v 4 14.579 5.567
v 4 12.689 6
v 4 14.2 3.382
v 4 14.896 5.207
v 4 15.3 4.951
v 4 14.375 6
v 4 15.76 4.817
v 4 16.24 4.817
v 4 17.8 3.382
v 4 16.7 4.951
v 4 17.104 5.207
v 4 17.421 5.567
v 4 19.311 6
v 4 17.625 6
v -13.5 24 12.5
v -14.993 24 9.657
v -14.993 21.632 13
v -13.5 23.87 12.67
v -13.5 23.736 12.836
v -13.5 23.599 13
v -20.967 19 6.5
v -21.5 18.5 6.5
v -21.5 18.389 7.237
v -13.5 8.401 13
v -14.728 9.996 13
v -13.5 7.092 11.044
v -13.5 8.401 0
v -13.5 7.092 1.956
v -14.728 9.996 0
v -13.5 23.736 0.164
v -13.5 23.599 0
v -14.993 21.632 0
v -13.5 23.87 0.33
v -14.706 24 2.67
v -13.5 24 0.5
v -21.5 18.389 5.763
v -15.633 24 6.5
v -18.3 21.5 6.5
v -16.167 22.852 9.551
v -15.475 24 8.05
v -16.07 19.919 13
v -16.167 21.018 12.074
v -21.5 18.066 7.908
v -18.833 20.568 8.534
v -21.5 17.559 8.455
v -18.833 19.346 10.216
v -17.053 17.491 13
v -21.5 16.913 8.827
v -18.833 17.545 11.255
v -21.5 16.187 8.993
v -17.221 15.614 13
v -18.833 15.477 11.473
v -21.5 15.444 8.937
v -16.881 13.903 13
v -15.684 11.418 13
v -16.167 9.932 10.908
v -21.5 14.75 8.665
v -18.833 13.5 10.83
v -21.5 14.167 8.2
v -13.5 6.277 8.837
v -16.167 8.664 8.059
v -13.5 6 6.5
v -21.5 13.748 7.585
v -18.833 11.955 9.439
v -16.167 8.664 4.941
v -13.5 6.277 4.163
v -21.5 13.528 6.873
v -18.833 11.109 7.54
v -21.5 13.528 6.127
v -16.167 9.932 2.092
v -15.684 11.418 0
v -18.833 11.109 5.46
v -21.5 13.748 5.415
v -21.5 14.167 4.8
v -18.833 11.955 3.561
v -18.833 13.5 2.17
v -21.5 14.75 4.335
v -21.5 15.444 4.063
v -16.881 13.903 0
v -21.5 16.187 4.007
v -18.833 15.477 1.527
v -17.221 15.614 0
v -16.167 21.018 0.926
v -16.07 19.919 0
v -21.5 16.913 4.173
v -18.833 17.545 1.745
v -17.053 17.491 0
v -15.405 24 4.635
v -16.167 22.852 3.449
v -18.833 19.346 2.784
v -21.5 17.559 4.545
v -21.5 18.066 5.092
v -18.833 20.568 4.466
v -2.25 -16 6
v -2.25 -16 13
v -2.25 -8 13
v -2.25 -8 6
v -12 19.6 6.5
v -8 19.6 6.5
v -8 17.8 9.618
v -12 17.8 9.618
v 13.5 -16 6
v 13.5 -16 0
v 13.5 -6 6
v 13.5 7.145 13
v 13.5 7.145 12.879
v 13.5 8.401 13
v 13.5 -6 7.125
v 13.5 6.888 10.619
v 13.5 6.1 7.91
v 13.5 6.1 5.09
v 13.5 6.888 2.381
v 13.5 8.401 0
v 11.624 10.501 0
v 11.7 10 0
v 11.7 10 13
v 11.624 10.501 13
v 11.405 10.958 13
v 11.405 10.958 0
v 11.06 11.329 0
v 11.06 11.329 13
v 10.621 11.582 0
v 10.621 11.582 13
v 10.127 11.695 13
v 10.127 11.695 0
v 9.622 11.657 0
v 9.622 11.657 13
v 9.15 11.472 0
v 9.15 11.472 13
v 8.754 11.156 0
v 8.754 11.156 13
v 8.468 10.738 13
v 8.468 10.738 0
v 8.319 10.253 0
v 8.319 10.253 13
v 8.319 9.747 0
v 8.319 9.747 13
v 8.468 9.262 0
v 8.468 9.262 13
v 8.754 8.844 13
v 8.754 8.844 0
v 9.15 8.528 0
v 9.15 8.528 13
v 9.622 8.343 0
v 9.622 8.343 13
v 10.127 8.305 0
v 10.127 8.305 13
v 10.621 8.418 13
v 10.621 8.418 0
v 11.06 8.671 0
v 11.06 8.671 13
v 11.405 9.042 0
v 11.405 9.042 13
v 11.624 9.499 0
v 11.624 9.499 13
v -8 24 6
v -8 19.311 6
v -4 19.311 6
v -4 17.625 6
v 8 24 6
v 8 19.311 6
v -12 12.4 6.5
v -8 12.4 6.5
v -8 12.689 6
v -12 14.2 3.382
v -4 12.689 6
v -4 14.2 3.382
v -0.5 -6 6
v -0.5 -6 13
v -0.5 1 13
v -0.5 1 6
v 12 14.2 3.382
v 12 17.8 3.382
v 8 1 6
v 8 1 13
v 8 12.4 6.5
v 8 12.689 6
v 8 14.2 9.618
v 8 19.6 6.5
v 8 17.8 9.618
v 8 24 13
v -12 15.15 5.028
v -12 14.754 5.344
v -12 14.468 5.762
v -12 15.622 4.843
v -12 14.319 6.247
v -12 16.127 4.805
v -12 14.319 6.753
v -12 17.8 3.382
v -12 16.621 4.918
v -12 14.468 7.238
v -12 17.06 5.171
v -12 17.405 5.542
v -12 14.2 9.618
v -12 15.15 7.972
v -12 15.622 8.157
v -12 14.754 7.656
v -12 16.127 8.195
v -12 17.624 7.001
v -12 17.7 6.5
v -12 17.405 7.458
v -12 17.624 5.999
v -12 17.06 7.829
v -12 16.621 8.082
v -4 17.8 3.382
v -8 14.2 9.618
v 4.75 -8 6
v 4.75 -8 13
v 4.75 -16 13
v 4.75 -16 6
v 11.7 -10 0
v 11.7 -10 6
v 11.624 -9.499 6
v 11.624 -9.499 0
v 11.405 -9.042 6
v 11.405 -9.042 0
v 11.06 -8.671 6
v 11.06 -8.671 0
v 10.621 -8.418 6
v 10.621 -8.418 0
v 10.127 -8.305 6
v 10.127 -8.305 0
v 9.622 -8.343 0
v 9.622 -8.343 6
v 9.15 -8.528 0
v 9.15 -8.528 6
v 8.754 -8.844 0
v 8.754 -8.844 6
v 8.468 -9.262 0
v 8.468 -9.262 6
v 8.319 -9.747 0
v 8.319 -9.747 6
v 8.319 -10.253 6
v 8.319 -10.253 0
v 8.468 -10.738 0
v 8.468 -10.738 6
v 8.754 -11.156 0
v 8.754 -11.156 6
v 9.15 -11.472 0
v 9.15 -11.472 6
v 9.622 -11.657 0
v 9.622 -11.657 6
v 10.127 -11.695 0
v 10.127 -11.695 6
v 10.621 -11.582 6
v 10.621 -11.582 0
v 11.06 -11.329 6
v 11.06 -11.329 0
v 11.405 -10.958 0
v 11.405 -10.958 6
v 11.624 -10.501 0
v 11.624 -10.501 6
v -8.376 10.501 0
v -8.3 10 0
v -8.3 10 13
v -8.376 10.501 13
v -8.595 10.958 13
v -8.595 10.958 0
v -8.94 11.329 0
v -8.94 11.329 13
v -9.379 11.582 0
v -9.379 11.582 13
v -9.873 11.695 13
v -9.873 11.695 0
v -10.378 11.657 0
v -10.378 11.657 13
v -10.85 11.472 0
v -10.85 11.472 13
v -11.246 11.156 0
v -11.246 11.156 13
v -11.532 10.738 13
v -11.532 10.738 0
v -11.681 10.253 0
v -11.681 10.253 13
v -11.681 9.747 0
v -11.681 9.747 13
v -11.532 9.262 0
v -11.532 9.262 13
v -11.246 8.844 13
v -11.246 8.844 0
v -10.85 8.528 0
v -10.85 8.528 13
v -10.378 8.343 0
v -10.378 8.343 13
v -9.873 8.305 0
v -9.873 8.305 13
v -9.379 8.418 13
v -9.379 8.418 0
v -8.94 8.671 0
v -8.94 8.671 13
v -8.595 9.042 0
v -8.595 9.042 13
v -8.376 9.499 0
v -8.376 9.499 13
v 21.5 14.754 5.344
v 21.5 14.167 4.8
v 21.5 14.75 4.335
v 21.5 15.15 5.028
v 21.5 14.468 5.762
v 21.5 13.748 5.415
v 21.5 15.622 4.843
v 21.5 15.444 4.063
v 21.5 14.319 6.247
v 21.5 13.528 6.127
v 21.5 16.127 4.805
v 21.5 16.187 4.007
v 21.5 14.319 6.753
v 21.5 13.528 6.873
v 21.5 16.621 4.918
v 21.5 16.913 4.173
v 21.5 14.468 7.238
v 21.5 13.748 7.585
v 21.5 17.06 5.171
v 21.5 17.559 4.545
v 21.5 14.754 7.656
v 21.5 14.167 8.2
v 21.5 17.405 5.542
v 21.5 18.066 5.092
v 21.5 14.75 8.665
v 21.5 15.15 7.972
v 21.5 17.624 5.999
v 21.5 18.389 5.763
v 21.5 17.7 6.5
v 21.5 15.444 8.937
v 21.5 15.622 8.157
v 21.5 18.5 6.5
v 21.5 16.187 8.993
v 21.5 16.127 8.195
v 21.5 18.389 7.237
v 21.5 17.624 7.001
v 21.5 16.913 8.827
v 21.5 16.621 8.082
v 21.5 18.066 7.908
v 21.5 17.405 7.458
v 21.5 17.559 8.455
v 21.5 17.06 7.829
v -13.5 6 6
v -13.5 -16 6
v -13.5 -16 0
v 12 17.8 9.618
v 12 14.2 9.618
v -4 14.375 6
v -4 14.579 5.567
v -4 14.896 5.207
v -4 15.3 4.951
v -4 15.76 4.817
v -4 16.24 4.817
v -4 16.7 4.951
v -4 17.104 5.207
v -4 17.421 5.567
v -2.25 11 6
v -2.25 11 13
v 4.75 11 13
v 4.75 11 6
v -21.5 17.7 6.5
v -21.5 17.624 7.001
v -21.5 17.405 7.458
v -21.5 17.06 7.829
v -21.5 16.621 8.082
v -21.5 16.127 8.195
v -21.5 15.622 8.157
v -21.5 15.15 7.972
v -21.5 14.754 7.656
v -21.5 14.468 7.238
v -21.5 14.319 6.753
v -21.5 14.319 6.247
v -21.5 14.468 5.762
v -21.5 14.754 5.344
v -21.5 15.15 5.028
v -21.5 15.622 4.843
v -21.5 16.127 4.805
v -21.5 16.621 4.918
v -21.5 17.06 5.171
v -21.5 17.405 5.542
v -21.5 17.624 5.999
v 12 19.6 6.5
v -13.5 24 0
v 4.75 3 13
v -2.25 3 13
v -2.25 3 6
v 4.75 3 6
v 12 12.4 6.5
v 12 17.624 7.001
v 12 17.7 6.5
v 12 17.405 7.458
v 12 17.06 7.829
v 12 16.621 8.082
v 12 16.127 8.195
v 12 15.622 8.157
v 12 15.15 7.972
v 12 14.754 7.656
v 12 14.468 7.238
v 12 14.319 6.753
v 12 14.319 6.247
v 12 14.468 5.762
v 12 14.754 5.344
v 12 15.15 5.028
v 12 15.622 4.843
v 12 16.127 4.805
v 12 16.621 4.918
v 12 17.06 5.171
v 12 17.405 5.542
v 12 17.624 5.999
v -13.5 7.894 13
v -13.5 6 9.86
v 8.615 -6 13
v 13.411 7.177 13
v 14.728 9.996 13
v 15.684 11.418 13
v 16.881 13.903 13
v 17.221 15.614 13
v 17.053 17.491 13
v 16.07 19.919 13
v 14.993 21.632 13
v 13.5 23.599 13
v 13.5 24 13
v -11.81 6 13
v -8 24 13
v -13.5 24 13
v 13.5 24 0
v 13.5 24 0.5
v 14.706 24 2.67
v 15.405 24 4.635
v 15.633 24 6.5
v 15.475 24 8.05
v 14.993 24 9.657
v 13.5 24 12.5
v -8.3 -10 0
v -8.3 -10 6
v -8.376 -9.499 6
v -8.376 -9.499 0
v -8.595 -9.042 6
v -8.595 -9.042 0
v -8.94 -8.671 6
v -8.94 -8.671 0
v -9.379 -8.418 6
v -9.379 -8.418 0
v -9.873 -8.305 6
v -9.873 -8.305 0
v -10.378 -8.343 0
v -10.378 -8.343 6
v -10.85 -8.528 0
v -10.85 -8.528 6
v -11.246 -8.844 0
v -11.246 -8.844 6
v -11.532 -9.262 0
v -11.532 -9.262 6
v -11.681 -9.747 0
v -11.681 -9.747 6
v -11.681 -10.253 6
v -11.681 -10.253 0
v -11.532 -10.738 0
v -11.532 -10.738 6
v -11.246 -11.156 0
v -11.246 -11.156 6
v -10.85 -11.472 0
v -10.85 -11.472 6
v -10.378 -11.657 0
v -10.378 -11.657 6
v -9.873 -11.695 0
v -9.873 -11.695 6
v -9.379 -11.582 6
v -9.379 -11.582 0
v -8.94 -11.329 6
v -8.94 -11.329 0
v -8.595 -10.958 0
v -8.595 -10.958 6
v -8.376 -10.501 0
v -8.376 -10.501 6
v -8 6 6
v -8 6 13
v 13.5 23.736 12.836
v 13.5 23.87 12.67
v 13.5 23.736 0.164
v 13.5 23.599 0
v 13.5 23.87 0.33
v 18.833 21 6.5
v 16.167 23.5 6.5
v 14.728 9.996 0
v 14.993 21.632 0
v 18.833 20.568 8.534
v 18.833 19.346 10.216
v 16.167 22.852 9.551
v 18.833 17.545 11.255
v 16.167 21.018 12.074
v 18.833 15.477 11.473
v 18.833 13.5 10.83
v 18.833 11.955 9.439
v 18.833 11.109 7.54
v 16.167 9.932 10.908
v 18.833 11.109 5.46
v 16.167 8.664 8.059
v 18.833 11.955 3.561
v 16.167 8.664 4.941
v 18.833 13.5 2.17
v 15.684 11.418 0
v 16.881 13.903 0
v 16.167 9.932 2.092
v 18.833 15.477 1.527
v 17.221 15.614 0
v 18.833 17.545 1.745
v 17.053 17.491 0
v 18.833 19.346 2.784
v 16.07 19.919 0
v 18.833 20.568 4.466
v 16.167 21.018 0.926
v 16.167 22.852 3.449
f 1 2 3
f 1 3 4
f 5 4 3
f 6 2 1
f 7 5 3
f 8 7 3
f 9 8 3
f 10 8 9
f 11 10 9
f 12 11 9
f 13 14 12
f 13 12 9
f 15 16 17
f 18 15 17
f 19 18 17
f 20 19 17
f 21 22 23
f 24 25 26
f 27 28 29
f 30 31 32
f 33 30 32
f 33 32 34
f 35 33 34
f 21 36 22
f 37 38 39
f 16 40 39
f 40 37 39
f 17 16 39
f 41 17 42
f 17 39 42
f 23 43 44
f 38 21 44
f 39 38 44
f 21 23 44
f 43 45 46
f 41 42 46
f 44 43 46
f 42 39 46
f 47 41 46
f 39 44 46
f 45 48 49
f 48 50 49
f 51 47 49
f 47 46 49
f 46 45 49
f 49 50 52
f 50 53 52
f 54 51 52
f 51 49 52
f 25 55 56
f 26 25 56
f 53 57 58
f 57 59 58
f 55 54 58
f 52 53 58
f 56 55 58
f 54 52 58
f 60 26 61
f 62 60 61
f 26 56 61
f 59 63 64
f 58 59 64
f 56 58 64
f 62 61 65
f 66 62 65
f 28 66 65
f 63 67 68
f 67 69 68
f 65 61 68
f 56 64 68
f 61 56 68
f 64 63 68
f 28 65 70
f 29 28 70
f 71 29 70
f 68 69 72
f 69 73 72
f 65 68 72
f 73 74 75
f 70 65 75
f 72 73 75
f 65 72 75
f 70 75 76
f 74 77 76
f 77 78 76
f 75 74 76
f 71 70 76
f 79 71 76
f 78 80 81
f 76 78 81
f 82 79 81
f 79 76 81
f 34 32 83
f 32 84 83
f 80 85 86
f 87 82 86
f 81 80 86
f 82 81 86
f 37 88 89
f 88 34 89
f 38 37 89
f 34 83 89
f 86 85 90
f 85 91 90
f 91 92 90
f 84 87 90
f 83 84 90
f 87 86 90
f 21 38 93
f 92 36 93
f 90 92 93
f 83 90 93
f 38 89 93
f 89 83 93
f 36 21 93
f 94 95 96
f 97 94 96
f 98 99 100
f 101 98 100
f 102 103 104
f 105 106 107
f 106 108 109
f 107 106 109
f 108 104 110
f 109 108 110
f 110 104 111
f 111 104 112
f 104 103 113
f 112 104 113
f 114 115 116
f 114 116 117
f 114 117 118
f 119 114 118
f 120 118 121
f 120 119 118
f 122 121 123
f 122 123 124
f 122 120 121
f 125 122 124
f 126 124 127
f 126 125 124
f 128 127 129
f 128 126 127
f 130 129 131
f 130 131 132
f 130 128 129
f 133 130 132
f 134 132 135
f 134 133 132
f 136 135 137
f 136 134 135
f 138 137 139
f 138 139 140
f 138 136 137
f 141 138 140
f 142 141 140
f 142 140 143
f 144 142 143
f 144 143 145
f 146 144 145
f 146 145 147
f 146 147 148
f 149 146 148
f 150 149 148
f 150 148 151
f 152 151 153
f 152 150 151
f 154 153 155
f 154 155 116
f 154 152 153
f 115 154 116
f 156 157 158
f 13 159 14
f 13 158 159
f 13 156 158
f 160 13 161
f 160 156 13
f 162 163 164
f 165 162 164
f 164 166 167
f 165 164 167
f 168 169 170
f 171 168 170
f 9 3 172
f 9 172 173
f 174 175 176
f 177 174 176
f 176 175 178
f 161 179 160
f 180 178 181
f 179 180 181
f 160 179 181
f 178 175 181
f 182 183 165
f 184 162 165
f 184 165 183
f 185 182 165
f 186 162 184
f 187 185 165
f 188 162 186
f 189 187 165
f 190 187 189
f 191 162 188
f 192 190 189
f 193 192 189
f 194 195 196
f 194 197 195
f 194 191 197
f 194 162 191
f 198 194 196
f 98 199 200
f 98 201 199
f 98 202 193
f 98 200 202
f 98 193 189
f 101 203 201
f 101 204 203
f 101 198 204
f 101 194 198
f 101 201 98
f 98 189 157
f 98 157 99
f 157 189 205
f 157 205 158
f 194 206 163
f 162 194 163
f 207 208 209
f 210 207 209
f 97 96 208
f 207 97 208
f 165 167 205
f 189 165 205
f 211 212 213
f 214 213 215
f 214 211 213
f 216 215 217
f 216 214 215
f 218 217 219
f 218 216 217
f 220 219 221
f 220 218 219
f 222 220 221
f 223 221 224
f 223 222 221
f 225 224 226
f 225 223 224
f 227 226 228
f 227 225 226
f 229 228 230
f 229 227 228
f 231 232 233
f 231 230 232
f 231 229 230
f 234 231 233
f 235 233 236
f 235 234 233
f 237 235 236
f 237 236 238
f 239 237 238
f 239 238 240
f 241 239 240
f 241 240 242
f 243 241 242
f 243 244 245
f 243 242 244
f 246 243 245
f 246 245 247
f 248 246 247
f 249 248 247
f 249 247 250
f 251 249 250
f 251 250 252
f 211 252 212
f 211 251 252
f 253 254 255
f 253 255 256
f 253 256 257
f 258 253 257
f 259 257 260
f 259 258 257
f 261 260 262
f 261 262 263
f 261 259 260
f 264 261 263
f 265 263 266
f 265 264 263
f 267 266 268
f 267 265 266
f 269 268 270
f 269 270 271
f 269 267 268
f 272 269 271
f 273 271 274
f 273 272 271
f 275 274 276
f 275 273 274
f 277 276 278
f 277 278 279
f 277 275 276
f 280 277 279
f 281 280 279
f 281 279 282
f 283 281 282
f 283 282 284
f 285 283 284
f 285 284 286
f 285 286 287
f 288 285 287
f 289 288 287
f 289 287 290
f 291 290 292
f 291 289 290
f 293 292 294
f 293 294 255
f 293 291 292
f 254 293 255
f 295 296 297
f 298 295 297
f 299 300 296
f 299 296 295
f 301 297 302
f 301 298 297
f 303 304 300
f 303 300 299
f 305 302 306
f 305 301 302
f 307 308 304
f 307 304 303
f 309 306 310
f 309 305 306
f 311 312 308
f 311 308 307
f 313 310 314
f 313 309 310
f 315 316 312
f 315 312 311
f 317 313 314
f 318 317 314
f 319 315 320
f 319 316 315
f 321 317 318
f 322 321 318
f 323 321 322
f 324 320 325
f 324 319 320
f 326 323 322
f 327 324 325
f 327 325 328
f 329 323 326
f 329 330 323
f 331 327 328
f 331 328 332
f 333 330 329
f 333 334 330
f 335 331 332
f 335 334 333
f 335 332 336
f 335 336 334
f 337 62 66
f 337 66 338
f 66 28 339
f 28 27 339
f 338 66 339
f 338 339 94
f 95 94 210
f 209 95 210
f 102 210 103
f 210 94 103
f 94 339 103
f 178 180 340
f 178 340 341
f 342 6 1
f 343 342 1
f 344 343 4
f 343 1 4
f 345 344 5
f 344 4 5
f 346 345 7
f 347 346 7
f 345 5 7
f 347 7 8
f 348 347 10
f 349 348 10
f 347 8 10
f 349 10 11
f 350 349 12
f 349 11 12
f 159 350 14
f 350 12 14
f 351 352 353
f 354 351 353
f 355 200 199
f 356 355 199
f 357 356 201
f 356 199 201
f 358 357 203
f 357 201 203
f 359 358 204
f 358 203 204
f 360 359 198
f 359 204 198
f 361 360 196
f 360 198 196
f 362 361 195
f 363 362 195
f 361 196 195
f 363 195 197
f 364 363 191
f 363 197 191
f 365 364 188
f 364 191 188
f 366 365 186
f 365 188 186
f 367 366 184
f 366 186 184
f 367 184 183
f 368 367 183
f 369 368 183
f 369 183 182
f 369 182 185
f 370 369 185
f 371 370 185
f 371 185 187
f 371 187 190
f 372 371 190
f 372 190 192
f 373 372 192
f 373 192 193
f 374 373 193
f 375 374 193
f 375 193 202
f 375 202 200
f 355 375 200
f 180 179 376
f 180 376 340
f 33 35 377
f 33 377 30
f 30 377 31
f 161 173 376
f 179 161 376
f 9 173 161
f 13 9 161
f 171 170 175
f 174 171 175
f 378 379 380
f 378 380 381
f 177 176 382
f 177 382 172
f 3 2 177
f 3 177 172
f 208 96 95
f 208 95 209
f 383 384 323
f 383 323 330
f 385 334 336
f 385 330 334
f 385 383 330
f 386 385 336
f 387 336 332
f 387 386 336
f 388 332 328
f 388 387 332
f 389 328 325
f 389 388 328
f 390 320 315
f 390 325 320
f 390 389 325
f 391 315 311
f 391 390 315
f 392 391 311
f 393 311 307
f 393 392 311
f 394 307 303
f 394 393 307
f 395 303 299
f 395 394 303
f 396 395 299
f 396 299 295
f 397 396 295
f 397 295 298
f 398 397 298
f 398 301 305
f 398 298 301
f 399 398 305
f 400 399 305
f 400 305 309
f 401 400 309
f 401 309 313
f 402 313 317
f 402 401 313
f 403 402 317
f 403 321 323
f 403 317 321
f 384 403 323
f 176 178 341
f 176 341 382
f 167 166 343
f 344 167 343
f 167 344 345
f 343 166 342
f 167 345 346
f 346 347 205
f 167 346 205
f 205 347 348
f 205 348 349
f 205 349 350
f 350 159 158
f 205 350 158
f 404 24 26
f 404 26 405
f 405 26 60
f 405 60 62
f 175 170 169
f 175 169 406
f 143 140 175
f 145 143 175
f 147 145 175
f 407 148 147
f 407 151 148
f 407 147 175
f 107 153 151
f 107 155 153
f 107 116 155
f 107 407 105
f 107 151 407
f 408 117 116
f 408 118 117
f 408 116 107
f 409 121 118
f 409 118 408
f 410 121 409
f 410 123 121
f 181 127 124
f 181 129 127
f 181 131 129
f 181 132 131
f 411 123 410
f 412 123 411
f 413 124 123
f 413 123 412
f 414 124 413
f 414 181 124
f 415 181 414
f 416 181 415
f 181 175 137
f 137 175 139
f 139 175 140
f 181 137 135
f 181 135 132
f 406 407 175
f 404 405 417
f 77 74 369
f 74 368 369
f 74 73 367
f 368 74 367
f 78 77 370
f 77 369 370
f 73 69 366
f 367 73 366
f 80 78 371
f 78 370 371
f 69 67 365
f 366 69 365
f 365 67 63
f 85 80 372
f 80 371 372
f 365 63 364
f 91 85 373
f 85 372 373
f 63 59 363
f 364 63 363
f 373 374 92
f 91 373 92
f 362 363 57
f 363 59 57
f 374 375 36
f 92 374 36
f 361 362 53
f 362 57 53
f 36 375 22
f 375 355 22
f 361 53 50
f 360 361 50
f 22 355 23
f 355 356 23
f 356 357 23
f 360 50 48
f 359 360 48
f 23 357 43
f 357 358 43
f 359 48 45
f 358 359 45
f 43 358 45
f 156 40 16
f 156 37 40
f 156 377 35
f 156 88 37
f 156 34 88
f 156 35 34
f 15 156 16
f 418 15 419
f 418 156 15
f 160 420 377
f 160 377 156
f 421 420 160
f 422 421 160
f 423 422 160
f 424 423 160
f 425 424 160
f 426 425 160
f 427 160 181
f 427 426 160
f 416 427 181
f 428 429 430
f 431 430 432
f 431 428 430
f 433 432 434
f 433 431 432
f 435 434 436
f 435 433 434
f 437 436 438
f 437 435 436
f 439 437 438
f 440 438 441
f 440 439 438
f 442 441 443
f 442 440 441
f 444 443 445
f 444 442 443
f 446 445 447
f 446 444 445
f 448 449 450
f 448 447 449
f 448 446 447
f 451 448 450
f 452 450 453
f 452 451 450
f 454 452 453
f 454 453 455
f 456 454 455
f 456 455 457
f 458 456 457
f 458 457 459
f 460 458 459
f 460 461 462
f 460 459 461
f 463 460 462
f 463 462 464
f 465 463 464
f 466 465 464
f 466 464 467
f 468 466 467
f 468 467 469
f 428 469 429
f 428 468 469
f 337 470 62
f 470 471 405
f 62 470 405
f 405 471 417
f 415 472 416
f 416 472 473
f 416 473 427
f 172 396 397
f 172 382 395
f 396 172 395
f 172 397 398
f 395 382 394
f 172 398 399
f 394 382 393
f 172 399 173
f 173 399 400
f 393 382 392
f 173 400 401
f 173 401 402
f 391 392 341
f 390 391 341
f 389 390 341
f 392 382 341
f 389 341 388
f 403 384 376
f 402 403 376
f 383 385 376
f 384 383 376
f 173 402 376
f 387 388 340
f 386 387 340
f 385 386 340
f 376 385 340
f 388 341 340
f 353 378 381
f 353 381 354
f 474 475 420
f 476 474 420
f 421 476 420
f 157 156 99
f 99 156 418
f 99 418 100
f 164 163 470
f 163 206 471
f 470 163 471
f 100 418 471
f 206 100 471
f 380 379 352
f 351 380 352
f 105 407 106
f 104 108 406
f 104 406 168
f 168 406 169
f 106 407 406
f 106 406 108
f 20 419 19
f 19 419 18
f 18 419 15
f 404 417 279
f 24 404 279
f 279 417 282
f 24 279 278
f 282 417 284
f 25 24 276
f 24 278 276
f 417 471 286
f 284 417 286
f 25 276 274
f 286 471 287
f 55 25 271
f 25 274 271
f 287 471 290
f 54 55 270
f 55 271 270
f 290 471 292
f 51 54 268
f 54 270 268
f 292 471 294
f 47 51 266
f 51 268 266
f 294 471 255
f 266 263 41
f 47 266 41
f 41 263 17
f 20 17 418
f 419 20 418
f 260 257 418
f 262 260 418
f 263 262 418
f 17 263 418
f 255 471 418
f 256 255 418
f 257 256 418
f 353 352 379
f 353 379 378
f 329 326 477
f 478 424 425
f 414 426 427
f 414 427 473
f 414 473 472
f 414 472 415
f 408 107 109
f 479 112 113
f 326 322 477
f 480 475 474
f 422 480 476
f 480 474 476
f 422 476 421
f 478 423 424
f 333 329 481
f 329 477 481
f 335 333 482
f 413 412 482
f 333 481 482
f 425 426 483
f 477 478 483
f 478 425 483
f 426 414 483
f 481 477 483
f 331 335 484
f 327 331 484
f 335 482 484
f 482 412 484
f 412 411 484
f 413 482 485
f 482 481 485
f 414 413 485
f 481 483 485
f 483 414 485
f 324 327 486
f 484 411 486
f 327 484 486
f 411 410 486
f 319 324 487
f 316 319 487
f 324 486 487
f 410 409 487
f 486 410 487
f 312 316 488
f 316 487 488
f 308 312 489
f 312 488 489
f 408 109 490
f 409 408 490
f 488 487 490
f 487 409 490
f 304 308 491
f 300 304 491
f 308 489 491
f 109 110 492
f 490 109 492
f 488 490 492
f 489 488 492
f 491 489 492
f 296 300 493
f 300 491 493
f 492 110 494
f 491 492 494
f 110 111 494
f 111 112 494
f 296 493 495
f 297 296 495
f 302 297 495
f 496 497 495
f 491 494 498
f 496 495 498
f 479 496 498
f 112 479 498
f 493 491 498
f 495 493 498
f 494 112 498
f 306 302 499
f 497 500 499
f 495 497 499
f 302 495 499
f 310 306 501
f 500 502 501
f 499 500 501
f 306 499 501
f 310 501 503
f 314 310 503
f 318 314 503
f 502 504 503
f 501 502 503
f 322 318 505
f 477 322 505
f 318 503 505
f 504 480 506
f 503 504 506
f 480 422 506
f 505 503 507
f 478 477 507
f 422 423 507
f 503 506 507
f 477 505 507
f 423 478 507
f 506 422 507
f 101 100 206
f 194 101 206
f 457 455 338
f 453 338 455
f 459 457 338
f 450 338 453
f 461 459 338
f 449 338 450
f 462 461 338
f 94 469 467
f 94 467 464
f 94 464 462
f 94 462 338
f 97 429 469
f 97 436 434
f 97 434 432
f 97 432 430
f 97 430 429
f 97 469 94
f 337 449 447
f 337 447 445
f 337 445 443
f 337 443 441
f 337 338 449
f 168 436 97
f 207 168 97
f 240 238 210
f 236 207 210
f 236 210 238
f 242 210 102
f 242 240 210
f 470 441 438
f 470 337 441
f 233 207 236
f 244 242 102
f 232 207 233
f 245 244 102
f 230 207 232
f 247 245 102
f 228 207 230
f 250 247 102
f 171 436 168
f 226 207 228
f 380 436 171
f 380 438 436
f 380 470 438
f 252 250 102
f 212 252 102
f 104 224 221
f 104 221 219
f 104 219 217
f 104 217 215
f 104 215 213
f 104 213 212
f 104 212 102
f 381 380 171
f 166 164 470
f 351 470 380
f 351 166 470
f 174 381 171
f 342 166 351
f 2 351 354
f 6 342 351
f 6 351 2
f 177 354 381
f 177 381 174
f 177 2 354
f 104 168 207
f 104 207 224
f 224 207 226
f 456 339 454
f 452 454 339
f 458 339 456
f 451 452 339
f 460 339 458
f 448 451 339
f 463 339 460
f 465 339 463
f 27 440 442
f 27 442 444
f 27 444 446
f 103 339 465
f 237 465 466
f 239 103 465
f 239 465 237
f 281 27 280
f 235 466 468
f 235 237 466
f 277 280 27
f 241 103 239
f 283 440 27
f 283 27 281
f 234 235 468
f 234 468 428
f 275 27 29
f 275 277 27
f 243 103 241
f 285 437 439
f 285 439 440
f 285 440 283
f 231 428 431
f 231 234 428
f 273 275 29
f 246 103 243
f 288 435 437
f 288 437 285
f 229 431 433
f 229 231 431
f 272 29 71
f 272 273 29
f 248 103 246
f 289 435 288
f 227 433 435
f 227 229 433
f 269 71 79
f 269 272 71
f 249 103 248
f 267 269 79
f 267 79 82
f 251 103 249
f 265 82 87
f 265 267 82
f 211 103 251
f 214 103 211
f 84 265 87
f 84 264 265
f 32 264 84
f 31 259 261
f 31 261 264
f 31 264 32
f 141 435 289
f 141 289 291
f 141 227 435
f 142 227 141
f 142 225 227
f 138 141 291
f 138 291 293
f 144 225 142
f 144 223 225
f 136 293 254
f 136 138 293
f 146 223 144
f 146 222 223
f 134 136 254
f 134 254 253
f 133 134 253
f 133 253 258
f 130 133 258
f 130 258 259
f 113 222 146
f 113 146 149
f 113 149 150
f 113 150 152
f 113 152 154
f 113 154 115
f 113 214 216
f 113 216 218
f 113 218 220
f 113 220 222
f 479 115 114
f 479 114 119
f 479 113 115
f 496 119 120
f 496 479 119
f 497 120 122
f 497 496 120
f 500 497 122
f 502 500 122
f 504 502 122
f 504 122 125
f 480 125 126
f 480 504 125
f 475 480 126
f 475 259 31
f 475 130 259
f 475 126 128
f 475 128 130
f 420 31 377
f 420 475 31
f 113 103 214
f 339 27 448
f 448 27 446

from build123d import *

# Parameters (mm, degrees)
SKETCH019_R          = 1.7
PAD002_DEPTH         = 13
SKETCH020_W          = 7
SKETCH020_H          = 8
POCKET017_DEPTH      = 7
POCKET019_DEPTH      = 8
POCKET020_DEPTH      = 8
SKETCH024_R          = 2.5
SKETCH025_R          = 10
SKETCH027_R          = 10
SKETCH026_R          = 2.5
SKETCH021_R          = 1.7
POCKET021_DEPTH      = 21.5010001
POCKET021_DEPTH_BACK = 21.5010001
SKETCH028_W          = 57.890867
SKETCH028_H          = 28.005435
SKETCH028_W_2        = 40
SKETCH028_H_2        = 13
POCKET022_DEPTH      = 21.5010001
POCKET022_DEPTH_BACK = 21.5010001
SKETCH029_W          = 10.751613
SKETCH029_H          = 15.361299
POCKET023_DEPTH      = 5
SKETCH030_W          = 5.428132
SKETCH030_H          = 4.529939
POCKET024_DEPTH      = 5


with BuildPart() as part:
    # Sketch019 → Pad002 (new body)
    with BuildSketch(Plane.XY):
        Polygon((-13.5, -16), (13.5, -16), (13.5, 6), (13.5, 24), (-13.5, 24), (-13.5, 6), align=None)
        with Locations((10, 10)):
            Circle(SKETCH019_R, mode=Mode.SUBTRACT)
        with Locations((-10, 10)):
            Circle(SKETCH019_R, mode=Mode.SUBTRACT)
        with Locations((-10, -10)):
            Circle(SKETCH019_R, mode=Mode.SUBTRACT)
        with Locations((10, -10)):
            Circle(SKETCH019_R, mode=Mode.SUBTRACT)
    extrude(amount=PAD002_DEPTH)

    # Sketch020 → Pocket017 (cut)
    with BuildSketch(Plane.XY.offset(13)):
        Polygon((-2.25, -8), (4.75, -8), (4.75, -16), (13.5, -16), (13.5, -6), (-0.5, -6), (-0.5, 1), (8, 1), (8, 24), (-8, 24), (-8, 6), (-13.5, 6), (-13.5, -16), (-2.25, -16), align=None)
        with Locations((1.25, 7)):
            Rectangle(SKETCH020_W, SKETCH020_H, mode=Mode.SUBTRACT)
    extrude(amount=-POCKET017_DEPTH, mode=Mode.SUBTRACT)

    # Sketch022 → Pocket019 (cut)
    with BuildSketch(Plane.YZ.offset(4)):
        Polygon((19.6, 6.5), (17.8, 9.6176914536), (14.2, 9.6176914536), (12.4, 6.5), (14.2, 3.3823085464), (17.8, 3.3823085464), align=None)
    extrude(amount=POCKET019_DEPTH, mode=Mode.SUBTRACT)

    # Sketch023 → Pocket020 (cut)
    with BuildSketch(Plane.YZ.offset(-4)):
        Polygon((19.6, 6.5), (17.8, 9.6176914536), (14.2, 9.6176914536), (12.4, 6.5), (14.2, 3.3823085464), (17.8, 3.3823085464), align=None)
    extrude(amount=-POCKET020_DEPTH, mode=Mode.SUBTRACT)

    # Sketch024 → AdditiveLoft section 0
    with BuildSketch(Plane.YZ.offset(21.5)):
        with Locations((16, 6.5)):
            Circle(SKETCH024_R)
    # Sketch025 → AdditiveLoft section 1
    with BuildSketch(Plane.YZ.offset(13.5)):
        with Locations((16, 6.5)):
            Circle(SKETCH025_R)
    loft()

    # Sketch027 → AdditiveLoft001 section 0
    with BuildSketch(Plane.YZ.offset(-13.5)):
        with Locations((16, 6.5)):
            Circle(SKETCH027_R)
    # Sketch026 → AdditiveLoft001 section 1
    with BuildSketch(Plane.YZ.offset(-21.5)):
        with Locations((16, 6.5)):
            Circle(SKETCH026_R)
    loft()

    # Sketch021 → Pocket021 (cut, two sides)
    with BuildSketch(Plane.YZ) as pocket021_sk:
        with Locations((16, 6.5)):
            Circle(SKETCH021_R)
    extrude(amount=-POCKET021_DEPTH, mode=Mode.SUBTRACT)
    extrude(pocket021_sk.sketch, amount=POCKET021_DEPTH_BACK, mode=Mode.SUBTRACT)

    # Sketch028 → Pocket022 (cut, two sides)
    with BuildSketch(Plane.YZ) as pocket022_sk:
        with Locations((4.9093215, 6.8553455)):
            Rectangle(SKETCH028_W, SKETCH028_H)
        with Locations((4, 6.5)):
            Rectangle(SKETCH028_W_2, SKETCH028_H_2, mode=Mode.SUBTRACT)
    extrude(amount=-POCKET022_DEPTH, mode=Mode.SUBTRACT)
    extrude(pocket022_sk.sketch, amount=POCKET022_DEPTH_BACK, mode=Mode.SUBTRACT)

    # Sketch029 (on DatumPlane) → Pocket023 (cut)
    with BuildSketch(Plane(origin=(11.8478062442, -4.3122488143, 9.8505836052), x_dir=(0.5785325453, -0.210568626, -0.7880107536), z_dir=(0.7404878903, -0.2695155509, 0.6156614753))):
        with Locations((-0.9861515, 3.6505885)):
            Rectangle(SKETCH029_W, SKETCH029_H)
    extrude(amount=POCKET023_DEPTH, mode=Mode.SUBTRACT)

    # Sketch030 (on DatumPlane) → Pocket024 (cut)
    with BuildSketch(Plane(origin=(0, 0, 25), x_dir=(0.2777686245, 0.2484410627, 0.9279663947), z_dir=(-0.6924826787, -0.6177293717, 0.3726636058))):
        with Locations((-14.088813, 13.6448355)):
            Rectangle(SKETCH030_W, SKETCH030_H)
    extrude(amount=POCKET024_DEPTH, mode=Mode.SUBTRACT)


solid = part.part
